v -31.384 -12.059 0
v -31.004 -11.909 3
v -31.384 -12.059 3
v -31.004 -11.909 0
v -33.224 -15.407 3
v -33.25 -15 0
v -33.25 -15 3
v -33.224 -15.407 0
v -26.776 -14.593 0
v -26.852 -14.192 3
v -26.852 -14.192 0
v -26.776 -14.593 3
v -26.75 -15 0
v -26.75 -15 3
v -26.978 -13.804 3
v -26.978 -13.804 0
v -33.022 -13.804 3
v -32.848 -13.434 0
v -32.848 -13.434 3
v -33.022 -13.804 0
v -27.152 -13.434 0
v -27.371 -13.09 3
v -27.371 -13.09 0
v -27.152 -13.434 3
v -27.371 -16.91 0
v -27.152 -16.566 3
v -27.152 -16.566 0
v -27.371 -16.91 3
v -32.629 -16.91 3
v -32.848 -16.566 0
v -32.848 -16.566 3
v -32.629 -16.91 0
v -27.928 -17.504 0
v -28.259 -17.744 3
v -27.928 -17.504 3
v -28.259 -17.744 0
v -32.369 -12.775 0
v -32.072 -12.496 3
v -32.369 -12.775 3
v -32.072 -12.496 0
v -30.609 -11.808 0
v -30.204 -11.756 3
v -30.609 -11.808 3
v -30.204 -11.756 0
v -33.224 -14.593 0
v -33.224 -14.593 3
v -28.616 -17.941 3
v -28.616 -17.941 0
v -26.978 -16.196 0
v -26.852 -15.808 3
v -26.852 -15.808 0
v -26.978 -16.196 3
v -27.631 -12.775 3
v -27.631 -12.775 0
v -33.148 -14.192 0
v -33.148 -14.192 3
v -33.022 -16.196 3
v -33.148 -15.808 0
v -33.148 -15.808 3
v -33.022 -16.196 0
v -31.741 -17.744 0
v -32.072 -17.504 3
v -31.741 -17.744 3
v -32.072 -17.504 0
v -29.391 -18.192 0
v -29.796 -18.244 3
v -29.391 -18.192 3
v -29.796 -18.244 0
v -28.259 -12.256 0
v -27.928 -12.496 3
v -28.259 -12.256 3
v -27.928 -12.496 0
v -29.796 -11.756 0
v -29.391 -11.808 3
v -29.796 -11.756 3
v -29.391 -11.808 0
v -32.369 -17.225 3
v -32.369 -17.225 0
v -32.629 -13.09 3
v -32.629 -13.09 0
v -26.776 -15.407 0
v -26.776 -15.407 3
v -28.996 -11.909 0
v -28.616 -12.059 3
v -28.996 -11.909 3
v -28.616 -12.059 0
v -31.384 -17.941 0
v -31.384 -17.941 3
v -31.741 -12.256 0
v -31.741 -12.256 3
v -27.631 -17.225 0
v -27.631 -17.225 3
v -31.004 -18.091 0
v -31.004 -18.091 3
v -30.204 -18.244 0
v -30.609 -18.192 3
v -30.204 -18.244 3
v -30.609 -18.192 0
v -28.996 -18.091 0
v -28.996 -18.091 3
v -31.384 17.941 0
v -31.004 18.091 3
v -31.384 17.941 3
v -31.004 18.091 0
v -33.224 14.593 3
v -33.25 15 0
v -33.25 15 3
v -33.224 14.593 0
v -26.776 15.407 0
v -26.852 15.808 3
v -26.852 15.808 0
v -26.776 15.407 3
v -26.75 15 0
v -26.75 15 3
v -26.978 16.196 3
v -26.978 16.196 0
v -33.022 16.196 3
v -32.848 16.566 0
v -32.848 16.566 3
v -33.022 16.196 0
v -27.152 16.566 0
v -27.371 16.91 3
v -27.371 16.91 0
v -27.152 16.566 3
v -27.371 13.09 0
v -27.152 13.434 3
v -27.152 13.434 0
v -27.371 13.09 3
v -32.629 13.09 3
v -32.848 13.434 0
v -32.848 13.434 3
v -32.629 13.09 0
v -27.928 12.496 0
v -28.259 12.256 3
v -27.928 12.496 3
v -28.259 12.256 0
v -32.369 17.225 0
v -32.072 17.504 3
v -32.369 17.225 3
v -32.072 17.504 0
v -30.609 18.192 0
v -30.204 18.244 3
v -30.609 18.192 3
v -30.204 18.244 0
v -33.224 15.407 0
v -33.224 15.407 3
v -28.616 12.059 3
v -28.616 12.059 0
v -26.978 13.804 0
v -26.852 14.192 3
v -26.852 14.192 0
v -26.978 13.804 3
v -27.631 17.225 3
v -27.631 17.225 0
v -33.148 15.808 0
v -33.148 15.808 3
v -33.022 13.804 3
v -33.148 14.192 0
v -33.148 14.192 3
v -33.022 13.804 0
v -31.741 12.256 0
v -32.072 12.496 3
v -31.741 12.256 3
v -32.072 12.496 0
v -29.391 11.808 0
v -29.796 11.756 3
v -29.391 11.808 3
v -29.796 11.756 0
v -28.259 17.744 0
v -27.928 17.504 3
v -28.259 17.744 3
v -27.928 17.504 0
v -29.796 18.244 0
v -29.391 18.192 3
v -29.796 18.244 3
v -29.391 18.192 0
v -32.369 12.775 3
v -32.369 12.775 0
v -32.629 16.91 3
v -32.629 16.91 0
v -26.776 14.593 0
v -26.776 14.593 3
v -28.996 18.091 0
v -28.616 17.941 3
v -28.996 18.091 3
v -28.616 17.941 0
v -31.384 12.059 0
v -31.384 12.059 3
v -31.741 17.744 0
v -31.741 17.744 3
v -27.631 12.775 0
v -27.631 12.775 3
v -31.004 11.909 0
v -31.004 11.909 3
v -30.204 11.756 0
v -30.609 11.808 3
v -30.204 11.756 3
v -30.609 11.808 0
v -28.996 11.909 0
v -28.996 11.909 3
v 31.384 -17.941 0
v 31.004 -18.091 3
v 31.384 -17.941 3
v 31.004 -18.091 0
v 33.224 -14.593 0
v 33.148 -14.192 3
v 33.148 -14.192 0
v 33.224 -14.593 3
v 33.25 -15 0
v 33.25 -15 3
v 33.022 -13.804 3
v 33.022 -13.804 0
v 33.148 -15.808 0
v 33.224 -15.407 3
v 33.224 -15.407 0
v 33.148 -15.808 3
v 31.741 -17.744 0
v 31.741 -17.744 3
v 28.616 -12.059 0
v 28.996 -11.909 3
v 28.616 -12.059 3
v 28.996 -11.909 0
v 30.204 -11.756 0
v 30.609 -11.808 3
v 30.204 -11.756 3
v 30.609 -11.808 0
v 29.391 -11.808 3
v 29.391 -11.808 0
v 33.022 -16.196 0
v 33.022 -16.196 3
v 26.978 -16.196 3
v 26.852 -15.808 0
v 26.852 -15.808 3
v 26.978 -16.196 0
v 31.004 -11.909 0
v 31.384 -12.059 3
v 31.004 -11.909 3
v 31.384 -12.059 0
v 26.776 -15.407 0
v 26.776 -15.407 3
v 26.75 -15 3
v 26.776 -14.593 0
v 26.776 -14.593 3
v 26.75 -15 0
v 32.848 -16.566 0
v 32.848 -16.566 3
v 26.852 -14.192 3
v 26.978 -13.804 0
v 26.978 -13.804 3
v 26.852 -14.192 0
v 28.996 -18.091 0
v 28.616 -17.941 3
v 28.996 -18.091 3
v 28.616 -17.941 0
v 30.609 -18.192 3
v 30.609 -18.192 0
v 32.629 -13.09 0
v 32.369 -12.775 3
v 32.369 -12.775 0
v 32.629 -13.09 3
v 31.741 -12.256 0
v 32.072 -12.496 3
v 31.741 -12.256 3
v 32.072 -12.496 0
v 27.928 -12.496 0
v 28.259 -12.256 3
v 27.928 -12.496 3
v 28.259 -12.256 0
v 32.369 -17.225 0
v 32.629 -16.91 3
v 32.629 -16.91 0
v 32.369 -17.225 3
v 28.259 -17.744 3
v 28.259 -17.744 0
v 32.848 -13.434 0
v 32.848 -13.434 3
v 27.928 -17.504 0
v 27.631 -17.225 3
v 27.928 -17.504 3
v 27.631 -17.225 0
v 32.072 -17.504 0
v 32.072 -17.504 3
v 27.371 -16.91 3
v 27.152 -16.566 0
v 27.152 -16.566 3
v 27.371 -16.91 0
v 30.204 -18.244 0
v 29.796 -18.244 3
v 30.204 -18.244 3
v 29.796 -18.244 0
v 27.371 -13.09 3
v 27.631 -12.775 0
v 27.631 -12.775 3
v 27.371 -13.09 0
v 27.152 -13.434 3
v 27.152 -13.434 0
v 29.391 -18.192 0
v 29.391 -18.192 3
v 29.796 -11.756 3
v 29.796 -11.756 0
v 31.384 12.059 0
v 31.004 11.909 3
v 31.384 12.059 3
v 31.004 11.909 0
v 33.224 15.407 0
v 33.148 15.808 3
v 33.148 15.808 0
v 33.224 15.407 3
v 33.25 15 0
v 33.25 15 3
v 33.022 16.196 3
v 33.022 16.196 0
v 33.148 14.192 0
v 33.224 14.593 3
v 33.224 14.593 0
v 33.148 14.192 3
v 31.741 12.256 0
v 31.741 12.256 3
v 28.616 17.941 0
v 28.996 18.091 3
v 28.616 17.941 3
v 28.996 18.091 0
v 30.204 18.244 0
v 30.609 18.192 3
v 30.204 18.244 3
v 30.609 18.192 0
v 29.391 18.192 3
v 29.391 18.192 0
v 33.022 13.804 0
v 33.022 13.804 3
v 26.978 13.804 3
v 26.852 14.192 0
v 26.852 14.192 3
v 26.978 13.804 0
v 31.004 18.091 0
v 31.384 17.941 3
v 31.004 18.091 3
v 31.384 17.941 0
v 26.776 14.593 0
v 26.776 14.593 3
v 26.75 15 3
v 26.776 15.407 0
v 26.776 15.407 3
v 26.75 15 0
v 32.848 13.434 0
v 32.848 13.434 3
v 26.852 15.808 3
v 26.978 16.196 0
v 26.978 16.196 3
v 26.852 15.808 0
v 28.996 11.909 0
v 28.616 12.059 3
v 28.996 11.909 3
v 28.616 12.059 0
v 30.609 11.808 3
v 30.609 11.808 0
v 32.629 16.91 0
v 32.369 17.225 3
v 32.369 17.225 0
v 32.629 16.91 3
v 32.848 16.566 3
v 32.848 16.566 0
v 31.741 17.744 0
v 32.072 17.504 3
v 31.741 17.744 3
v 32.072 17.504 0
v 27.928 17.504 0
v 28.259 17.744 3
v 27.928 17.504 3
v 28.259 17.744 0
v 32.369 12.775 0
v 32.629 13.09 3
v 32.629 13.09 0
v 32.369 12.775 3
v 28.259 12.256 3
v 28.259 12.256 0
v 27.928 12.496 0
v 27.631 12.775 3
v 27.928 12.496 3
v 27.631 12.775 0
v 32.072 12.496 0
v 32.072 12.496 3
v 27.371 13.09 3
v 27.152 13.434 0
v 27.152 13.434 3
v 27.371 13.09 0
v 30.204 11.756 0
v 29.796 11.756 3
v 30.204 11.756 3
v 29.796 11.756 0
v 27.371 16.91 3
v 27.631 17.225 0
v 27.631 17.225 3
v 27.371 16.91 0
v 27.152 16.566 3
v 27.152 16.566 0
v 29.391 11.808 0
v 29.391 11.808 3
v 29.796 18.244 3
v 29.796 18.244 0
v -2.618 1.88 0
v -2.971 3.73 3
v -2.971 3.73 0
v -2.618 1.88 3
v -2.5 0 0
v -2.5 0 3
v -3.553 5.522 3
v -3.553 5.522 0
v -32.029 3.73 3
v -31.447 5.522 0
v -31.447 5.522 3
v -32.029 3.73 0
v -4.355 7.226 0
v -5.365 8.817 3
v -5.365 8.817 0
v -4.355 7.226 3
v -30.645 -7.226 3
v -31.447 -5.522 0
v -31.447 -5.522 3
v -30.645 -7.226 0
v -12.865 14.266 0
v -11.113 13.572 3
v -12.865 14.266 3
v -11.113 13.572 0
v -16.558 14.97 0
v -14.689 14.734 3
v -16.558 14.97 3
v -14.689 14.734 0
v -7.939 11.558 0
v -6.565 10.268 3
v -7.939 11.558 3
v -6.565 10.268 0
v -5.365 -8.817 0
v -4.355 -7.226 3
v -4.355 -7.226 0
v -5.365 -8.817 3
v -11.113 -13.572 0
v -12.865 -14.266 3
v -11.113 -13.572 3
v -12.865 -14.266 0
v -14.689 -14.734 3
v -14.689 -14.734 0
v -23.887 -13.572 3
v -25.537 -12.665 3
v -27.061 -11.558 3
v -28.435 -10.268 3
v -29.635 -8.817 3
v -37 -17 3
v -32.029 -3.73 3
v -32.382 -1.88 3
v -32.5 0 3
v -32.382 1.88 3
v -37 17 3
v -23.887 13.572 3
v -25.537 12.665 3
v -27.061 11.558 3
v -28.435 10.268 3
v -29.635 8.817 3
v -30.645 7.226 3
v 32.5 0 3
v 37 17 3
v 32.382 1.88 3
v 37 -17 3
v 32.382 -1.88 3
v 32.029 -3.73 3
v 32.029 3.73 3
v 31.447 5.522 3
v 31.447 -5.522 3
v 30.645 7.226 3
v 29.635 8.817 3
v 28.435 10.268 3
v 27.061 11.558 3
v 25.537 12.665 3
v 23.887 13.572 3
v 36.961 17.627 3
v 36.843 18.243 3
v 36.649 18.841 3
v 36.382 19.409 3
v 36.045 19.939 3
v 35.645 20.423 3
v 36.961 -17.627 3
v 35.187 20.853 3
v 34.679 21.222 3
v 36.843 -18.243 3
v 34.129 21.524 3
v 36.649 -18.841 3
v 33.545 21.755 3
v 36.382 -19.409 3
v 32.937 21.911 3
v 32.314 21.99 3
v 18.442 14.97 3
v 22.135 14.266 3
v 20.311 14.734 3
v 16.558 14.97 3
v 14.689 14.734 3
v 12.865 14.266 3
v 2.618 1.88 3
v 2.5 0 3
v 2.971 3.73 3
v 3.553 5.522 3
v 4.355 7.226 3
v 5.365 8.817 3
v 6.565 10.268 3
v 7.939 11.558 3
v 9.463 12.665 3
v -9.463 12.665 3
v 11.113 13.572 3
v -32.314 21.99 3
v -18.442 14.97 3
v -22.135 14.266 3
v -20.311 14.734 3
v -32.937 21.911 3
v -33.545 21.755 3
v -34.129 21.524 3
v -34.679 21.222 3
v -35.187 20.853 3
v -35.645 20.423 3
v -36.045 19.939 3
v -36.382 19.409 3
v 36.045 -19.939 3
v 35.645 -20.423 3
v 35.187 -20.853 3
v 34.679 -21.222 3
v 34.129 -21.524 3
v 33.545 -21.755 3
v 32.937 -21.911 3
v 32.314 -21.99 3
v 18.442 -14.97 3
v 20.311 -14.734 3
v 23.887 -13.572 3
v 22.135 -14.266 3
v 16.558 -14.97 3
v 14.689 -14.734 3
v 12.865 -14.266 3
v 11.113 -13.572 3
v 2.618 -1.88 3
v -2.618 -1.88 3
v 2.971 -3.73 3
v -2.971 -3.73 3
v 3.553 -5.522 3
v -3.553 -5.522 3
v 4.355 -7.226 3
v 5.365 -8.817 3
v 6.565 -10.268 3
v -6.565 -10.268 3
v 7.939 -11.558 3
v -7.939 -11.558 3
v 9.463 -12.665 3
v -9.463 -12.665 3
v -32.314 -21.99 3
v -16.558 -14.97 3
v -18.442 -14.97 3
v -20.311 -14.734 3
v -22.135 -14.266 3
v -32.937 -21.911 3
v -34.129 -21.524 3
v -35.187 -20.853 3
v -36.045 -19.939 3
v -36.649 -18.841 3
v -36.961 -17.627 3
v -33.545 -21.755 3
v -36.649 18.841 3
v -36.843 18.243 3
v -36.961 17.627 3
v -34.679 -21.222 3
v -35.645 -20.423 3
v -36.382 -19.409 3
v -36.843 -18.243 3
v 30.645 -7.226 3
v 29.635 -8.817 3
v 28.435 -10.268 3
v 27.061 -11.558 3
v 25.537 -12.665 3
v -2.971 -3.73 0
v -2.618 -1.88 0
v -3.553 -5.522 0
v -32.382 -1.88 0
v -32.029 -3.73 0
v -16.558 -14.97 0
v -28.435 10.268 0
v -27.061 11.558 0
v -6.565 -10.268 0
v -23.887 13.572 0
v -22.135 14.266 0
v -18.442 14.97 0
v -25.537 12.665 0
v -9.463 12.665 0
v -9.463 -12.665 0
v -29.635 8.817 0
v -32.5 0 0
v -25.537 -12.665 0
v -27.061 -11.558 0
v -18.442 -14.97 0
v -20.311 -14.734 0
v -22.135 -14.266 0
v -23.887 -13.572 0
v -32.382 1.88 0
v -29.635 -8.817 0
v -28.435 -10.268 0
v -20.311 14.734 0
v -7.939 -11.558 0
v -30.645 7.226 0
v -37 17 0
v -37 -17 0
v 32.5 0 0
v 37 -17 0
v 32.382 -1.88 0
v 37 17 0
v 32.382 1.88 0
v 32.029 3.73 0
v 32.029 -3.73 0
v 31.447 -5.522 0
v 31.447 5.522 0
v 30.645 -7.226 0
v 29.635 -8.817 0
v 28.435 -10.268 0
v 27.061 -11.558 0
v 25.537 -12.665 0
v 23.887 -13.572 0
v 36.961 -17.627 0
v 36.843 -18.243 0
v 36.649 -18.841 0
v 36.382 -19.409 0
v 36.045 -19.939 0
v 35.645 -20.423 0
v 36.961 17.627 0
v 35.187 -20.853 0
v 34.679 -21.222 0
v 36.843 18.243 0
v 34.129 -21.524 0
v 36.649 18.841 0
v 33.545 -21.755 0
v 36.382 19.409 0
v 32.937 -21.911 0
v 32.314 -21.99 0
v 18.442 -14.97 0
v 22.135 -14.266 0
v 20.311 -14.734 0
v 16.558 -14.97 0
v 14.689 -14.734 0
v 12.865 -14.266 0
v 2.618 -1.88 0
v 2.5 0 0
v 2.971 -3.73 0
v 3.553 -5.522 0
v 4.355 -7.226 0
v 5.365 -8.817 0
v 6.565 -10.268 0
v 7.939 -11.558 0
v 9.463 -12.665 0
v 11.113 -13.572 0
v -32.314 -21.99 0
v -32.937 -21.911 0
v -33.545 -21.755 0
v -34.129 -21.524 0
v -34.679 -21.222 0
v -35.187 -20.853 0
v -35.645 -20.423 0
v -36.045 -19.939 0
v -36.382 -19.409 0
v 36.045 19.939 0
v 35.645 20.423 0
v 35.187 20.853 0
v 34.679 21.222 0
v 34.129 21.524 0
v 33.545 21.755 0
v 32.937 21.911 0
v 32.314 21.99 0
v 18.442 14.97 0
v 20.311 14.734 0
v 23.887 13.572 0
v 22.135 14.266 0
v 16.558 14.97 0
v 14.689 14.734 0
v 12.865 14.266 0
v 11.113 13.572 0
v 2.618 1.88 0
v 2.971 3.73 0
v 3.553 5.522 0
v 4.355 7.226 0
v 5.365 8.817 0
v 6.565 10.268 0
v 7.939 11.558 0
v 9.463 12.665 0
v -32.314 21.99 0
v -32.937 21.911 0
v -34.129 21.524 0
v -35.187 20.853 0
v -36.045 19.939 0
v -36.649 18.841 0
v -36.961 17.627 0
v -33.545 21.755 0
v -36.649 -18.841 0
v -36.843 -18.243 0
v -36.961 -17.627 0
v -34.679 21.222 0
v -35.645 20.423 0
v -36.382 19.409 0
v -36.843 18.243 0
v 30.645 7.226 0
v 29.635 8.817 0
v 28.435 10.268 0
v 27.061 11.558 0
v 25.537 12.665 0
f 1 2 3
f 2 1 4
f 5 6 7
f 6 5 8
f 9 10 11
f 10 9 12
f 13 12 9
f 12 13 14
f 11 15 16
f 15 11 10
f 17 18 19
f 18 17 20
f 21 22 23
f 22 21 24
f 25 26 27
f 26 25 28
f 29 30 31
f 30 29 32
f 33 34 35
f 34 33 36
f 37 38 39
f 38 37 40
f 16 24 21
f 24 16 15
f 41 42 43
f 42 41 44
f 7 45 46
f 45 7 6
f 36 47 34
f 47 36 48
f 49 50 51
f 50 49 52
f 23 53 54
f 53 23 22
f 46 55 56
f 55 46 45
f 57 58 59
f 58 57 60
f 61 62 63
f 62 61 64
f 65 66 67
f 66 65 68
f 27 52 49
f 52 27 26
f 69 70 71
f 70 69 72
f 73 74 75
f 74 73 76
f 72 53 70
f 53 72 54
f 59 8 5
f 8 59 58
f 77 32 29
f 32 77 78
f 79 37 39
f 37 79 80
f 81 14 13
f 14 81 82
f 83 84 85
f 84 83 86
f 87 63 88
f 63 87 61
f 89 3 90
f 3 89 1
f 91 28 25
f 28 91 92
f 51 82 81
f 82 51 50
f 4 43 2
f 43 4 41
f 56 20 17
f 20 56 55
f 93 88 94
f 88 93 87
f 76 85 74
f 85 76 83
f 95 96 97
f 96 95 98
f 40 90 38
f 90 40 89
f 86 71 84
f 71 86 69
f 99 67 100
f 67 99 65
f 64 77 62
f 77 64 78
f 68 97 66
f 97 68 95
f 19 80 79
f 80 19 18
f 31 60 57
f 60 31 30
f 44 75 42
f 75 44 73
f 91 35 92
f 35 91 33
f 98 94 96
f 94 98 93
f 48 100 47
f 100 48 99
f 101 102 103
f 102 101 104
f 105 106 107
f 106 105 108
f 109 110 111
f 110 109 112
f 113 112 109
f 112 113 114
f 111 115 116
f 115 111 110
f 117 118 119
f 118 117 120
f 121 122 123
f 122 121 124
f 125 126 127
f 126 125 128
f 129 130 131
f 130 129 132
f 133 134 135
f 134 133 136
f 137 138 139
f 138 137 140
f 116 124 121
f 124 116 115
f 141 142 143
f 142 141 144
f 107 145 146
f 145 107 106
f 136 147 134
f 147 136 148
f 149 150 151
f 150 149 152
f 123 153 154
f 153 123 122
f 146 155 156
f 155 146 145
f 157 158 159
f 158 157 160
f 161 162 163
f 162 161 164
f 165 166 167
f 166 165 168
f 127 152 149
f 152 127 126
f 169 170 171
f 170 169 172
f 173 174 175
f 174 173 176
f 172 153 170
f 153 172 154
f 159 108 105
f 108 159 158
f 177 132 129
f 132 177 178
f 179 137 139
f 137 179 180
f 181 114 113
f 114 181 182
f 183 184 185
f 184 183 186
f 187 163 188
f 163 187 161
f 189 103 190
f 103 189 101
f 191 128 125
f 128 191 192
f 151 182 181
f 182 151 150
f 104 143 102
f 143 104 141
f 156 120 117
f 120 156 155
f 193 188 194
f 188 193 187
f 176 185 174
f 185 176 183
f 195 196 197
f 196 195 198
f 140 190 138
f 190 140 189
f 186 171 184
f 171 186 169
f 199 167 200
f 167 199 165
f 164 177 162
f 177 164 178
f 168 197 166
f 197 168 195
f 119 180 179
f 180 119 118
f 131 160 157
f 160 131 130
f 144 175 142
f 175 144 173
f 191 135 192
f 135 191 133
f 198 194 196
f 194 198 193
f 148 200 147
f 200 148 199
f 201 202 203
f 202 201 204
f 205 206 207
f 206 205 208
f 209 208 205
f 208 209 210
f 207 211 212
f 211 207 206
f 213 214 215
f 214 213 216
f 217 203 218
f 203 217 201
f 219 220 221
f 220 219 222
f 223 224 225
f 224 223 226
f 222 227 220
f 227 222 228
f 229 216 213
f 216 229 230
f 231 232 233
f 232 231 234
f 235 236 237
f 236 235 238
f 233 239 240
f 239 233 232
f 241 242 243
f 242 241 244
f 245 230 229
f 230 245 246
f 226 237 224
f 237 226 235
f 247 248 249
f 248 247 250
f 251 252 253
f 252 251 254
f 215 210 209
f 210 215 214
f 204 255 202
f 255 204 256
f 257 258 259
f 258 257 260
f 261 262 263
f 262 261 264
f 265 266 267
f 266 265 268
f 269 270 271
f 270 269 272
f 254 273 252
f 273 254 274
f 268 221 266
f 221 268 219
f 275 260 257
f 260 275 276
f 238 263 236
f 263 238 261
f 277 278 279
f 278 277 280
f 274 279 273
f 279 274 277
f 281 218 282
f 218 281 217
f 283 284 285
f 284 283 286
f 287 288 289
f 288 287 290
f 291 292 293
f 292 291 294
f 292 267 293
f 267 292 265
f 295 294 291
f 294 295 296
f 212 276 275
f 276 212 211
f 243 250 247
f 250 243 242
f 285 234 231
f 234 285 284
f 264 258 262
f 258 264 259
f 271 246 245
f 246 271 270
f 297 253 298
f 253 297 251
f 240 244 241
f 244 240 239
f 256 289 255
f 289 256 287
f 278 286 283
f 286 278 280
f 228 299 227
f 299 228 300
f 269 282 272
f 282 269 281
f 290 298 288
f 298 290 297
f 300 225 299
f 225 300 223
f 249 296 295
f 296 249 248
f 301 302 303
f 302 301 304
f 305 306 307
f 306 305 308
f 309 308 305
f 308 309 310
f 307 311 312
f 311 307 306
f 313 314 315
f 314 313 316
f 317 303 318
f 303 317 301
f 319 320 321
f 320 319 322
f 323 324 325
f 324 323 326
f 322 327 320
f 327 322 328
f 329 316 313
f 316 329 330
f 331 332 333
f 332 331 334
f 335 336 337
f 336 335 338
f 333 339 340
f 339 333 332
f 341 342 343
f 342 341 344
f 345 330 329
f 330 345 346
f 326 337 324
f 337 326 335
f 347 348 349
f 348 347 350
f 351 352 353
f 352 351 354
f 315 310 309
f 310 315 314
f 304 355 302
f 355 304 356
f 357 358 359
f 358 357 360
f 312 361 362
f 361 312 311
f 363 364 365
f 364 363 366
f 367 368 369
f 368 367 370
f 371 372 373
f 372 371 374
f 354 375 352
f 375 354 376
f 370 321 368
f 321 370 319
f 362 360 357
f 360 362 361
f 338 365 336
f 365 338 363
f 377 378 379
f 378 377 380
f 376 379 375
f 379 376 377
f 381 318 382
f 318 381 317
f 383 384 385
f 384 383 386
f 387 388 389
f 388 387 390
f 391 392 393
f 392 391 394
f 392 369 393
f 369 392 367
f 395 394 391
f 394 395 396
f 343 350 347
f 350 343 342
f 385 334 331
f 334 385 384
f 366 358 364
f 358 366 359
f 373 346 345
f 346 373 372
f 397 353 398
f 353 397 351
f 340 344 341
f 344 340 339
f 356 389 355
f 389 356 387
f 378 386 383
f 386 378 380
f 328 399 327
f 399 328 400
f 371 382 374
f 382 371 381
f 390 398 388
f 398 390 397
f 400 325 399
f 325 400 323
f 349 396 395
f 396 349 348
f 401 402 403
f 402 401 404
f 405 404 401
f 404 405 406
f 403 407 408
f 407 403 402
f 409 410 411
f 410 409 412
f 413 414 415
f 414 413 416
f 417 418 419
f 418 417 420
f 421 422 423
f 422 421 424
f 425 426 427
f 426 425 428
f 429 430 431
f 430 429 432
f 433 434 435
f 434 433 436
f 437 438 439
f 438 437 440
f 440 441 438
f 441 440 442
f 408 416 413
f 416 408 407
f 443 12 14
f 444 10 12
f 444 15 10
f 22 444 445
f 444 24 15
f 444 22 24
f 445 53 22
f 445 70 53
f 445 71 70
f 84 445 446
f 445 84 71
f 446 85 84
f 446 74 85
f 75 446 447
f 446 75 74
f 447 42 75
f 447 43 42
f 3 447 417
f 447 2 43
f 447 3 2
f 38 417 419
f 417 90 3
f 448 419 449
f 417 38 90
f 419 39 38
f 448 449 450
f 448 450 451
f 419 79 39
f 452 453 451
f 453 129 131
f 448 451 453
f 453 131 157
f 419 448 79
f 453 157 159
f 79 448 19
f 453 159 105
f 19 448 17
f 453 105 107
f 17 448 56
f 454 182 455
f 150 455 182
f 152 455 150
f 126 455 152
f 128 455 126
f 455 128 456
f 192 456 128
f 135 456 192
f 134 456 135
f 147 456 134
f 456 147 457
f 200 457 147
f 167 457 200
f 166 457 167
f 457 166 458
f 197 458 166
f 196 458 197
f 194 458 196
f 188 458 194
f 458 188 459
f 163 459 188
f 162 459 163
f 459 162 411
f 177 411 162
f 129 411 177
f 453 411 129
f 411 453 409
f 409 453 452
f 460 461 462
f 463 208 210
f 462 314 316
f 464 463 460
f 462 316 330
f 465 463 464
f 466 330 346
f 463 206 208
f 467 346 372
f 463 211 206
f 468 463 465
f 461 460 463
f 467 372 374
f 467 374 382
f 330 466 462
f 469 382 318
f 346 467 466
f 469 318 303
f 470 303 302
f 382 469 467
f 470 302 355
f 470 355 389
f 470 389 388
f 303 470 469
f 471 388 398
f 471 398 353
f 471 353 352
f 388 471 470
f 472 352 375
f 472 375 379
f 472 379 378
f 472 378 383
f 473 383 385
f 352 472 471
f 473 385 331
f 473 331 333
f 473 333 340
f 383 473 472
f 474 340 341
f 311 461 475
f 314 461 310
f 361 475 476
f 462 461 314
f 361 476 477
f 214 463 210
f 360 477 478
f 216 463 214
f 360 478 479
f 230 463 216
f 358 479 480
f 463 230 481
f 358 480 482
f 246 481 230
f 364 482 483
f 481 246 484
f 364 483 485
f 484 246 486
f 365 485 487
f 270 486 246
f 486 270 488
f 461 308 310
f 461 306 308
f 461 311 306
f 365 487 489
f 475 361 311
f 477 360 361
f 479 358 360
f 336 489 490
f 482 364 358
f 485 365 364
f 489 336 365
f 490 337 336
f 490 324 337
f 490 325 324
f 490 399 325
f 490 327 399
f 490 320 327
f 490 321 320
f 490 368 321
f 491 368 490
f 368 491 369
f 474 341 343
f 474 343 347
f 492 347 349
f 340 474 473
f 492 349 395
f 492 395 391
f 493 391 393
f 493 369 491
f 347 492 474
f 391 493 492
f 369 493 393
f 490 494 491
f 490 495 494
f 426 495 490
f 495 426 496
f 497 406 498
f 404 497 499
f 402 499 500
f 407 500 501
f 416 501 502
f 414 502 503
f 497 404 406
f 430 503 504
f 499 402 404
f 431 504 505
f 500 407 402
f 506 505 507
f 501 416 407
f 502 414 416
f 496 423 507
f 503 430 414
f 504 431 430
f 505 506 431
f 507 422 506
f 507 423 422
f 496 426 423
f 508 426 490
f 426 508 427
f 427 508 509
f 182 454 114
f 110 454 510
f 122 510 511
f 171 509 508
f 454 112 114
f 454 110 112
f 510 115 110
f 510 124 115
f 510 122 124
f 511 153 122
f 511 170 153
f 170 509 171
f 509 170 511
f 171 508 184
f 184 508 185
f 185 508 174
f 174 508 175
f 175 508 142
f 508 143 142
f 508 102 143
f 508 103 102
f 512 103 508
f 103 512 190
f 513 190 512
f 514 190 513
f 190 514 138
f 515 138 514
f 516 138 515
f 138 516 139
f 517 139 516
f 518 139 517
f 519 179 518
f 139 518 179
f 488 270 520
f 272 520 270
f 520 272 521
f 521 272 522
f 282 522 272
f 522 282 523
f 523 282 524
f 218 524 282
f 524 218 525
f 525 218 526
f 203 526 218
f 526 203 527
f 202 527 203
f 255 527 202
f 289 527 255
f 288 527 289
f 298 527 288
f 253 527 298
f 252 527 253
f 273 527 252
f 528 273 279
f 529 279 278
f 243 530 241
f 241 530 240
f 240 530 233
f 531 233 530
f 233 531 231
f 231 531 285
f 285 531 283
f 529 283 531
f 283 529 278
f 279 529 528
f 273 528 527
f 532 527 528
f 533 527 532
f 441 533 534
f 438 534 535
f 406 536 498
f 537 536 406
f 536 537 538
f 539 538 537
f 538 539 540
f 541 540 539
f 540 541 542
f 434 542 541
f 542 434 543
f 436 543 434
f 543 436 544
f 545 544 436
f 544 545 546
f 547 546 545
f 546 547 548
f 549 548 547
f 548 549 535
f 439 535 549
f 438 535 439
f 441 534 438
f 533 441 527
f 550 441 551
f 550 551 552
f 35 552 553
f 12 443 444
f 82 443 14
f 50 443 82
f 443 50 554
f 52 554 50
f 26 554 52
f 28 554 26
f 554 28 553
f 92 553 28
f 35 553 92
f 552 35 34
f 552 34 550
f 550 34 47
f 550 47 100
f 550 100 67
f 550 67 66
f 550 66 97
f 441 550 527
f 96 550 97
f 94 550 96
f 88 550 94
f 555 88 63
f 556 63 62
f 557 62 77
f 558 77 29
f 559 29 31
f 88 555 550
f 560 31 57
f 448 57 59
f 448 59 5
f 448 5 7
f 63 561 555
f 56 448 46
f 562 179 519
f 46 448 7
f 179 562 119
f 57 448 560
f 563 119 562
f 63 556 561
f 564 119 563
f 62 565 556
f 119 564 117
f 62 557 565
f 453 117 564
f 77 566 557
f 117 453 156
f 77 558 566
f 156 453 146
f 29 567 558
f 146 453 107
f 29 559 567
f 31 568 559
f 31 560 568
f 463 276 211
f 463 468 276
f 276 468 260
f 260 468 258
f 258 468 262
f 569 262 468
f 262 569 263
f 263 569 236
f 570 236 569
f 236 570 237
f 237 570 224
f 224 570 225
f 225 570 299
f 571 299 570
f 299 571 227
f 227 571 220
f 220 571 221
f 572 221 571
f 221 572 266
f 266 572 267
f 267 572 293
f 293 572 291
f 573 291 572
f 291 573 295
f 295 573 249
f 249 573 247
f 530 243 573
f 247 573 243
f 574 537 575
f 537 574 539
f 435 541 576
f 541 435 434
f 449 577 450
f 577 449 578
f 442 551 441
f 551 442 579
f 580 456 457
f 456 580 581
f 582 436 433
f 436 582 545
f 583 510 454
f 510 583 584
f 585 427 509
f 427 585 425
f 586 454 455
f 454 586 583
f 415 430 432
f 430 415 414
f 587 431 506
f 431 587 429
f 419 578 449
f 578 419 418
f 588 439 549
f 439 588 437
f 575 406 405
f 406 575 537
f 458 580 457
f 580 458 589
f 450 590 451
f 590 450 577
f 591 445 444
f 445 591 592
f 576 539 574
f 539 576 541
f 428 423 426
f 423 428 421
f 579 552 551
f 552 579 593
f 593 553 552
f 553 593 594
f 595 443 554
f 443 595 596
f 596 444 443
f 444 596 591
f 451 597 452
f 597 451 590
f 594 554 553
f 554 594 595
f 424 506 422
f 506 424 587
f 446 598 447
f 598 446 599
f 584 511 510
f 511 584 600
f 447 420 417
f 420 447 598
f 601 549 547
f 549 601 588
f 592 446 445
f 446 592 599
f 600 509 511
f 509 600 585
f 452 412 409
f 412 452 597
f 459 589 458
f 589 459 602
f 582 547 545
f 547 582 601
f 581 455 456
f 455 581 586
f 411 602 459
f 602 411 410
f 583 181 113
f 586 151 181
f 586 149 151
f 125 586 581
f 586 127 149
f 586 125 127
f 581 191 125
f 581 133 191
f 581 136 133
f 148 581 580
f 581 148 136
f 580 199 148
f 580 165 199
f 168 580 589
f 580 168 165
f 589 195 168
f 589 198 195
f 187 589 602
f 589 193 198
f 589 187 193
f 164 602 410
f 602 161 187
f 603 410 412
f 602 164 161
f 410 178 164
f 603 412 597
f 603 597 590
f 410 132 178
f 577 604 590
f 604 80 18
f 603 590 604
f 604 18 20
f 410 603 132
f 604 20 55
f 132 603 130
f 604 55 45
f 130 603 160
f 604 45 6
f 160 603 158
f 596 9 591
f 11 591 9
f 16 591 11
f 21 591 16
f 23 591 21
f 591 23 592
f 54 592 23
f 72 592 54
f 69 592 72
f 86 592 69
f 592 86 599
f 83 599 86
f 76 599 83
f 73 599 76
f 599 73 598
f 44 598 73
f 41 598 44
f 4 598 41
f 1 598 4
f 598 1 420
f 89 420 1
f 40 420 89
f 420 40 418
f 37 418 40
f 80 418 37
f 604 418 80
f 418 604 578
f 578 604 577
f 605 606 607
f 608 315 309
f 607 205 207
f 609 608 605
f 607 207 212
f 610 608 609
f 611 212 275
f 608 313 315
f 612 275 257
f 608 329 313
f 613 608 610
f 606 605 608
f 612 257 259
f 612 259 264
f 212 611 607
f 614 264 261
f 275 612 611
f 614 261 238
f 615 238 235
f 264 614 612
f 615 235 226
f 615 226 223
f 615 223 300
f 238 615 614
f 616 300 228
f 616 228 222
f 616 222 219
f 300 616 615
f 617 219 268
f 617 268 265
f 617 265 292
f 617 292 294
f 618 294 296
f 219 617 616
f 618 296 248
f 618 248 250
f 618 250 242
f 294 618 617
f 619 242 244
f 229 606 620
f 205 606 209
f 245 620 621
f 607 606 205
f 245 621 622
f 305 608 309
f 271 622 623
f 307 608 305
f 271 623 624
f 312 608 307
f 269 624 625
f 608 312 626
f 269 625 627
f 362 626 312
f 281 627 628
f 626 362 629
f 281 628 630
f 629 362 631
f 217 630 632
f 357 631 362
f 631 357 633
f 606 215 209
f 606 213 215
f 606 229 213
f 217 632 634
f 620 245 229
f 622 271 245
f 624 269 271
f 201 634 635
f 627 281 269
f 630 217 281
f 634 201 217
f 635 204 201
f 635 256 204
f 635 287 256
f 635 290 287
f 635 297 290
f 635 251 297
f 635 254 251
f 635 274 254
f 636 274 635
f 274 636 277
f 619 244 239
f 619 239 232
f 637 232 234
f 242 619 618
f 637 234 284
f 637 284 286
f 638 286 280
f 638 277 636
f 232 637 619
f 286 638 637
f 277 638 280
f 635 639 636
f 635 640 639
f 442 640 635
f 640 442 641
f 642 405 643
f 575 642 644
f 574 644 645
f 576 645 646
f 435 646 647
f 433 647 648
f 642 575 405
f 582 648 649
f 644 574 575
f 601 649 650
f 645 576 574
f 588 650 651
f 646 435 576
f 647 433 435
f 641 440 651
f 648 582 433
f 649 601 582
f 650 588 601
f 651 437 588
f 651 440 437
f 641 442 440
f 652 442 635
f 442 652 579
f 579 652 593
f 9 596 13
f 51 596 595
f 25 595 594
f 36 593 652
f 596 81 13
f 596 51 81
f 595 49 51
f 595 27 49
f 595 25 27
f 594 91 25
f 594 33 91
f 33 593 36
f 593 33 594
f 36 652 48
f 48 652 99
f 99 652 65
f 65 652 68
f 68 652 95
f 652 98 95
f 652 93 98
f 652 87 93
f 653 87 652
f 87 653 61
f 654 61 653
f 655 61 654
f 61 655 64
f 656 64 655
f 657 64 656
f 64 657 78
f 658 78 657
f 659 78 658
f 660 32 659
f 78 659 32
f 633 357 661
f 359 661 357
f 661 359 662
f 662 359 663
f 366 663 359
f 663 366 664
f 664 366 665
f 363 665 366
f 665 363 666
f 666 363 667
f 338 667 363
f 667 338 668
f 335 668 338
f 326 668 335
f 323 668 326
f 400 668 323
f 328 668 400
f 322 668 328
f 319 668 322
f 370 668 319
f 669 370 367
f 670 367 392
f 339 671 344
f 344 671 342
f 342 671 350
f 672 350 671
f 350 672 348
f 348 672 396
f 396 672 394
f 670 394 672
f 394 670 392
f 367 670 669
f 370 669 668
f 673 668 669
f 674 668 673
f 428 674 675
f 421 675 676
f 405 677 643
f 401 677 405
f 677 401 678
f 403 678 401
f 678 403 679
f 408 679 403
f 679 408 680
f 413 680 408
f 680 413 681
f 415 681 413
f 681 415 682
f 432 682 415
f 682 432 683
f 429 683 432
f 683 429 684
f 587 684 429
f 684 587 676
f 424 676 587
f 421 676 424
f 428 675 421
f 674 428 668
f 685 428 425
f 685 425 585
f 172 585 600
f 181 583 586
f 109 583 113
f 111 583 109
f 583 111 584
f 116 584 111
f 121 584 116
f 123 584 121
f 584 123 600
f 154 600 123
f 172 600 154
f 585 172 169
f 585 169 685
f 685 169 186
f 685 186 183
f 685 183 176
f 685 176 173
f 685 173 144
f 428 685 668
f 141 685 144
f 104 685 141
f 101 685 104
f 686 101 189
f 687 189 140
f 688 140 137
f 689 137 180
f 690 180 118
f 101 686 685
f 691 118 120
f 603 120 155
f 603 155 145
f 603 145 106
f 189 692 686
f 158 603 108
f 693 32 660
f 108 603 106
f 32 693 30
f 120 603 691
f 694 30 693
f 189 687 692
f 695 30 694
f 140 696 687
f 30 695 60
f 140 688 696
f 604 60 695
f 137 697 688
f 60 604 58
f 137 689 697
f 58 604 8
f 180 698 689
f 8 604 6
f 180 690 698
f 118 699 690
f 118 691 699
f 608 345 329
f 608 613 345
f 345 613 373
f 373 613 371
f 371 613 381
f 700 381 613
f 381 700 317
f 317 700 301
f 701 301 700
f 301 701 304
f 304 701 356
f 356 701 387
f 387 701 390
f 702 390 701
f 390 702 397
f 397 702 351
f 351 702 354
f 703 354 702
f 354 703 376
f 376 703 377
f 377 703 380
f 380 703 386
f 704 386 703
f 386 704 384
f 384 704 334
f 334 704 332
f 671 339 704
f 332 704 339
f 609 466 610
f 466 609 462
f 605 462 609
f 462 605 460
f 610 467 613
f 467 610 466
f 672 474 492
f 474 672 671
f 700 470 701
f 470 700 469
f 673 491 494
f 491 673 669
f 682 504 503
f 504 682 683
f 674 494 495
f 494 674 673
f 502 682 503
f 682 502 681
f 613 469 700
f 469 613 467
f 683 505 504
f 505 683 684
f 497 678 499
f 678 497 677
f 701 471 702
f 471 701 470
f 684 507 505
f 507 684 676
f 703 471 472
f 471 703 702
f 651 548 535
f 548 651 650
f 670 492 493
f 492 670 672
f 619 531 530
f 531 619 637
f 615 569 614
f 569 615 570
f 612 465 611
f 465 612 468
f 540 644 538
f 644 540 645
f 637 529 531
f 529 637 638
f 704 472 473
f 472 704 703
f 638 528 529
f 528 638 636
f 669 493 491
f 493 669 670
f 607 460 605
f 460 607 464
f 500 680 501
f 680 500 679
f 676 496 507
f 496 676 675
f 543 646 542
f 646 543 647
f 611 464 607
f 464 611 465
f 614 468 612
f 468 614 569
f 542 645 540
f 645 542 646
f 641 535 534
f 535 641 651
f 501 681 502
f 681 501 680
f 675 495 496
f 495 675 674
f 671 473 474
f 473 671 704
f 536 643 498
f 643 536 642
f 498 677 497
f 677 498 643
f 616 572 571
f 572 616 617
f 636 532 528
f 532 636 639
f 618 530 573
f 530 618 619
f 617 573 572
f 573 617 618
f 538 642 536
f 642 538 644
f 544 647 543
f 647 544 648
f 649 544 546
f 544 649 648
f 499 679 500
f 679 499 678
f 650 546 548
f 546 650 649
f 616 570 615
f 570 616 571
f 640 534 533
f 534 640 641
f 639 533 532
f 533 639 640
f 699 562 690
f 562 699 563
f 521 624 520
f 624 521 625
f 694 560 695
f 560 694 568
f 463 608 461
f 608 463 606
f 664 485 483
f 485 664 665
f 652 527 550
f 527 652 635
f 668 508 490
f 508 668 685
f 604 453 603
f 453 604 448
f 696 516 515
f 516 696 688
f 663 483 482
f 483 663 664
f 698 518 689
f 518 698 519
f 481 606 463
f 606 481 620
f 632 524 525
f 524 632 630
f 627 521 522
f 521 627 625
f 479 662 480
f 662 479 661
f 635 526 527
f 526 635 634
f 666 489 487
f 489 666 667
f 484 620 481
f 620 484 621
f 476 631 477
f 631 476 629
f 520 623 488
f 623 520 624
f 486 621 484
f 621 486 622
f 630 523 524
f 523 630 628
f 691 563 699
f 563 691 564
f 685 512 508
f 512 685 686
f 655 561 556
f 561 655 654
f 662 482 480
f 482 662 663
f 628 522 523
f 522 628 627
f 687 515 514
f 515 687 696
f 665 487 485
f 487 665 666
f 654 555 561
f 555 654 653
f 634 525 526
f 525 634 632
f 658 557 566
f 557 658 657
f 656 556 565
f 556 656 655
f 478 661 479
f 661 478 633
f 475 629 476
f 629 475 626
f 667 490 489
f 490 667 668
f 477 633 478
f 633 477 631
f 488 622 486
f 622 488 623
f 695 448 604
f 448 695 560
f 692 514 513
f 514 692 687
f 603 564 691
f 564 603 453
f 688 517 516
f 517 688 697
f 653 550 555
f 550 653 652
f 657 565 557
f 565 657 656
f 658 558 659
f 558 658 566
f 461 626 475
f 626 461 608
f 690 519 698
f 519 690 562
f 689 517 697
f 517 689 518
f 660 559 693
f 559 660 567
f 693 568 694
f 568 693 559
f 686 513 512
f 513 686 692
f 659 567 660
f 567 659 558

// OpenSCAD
$fn = 50;


difference() {
	union() {
		hull() {
			translate(v = [-32.0000000000, 17.0000000000, 0]) {
				cylinder(h = 3, r = 5);
			}
			translate(v = [32.0000000000, 17.0000000000, 0]) {
				cylinder(h = 3, r = 5);
			}
			translate(v = [-32.0000000000, -17.0000000000, 0]) {
				cylinder(h = 3, r = 5);
			}
			translate(v = [32.0000000000, -17.0000000000, 0]) {
				cylinder(h = 3, r = 5);
			}
		}
	}
	union() {
		#translate(v = [-30.0000000000, -15.0000000000, -100.0000000000]) {
			cylinder(h = 200, r = 3.2500000000);
		}
		#translate(v = [-30.0000000000, 15.0000000000, -100.0000000000]) {
			cylinder(h = 200, r = 3.2500000000);
		}
		#translate(v = [30.0000000000, -15.0000000000, -100.0000000000]) {
			cylinder(h = 200, r = 3.2500000000);
		}
		#translate(v = [30.0000000000, 15.0000000000, -100.0000000000]) {
			cylinder(h = 200, r = 3.2500000000);
		}
		#translate(v = [-17.5000000000, 0, 0]) {
			cylinder(h = 3, r = 15.0000000000);
		}
		#translate(v = [17.5000000000, 0, 0]) {
			cylinder(h = 3, r = 15.0000000000);
		}
	}
}
